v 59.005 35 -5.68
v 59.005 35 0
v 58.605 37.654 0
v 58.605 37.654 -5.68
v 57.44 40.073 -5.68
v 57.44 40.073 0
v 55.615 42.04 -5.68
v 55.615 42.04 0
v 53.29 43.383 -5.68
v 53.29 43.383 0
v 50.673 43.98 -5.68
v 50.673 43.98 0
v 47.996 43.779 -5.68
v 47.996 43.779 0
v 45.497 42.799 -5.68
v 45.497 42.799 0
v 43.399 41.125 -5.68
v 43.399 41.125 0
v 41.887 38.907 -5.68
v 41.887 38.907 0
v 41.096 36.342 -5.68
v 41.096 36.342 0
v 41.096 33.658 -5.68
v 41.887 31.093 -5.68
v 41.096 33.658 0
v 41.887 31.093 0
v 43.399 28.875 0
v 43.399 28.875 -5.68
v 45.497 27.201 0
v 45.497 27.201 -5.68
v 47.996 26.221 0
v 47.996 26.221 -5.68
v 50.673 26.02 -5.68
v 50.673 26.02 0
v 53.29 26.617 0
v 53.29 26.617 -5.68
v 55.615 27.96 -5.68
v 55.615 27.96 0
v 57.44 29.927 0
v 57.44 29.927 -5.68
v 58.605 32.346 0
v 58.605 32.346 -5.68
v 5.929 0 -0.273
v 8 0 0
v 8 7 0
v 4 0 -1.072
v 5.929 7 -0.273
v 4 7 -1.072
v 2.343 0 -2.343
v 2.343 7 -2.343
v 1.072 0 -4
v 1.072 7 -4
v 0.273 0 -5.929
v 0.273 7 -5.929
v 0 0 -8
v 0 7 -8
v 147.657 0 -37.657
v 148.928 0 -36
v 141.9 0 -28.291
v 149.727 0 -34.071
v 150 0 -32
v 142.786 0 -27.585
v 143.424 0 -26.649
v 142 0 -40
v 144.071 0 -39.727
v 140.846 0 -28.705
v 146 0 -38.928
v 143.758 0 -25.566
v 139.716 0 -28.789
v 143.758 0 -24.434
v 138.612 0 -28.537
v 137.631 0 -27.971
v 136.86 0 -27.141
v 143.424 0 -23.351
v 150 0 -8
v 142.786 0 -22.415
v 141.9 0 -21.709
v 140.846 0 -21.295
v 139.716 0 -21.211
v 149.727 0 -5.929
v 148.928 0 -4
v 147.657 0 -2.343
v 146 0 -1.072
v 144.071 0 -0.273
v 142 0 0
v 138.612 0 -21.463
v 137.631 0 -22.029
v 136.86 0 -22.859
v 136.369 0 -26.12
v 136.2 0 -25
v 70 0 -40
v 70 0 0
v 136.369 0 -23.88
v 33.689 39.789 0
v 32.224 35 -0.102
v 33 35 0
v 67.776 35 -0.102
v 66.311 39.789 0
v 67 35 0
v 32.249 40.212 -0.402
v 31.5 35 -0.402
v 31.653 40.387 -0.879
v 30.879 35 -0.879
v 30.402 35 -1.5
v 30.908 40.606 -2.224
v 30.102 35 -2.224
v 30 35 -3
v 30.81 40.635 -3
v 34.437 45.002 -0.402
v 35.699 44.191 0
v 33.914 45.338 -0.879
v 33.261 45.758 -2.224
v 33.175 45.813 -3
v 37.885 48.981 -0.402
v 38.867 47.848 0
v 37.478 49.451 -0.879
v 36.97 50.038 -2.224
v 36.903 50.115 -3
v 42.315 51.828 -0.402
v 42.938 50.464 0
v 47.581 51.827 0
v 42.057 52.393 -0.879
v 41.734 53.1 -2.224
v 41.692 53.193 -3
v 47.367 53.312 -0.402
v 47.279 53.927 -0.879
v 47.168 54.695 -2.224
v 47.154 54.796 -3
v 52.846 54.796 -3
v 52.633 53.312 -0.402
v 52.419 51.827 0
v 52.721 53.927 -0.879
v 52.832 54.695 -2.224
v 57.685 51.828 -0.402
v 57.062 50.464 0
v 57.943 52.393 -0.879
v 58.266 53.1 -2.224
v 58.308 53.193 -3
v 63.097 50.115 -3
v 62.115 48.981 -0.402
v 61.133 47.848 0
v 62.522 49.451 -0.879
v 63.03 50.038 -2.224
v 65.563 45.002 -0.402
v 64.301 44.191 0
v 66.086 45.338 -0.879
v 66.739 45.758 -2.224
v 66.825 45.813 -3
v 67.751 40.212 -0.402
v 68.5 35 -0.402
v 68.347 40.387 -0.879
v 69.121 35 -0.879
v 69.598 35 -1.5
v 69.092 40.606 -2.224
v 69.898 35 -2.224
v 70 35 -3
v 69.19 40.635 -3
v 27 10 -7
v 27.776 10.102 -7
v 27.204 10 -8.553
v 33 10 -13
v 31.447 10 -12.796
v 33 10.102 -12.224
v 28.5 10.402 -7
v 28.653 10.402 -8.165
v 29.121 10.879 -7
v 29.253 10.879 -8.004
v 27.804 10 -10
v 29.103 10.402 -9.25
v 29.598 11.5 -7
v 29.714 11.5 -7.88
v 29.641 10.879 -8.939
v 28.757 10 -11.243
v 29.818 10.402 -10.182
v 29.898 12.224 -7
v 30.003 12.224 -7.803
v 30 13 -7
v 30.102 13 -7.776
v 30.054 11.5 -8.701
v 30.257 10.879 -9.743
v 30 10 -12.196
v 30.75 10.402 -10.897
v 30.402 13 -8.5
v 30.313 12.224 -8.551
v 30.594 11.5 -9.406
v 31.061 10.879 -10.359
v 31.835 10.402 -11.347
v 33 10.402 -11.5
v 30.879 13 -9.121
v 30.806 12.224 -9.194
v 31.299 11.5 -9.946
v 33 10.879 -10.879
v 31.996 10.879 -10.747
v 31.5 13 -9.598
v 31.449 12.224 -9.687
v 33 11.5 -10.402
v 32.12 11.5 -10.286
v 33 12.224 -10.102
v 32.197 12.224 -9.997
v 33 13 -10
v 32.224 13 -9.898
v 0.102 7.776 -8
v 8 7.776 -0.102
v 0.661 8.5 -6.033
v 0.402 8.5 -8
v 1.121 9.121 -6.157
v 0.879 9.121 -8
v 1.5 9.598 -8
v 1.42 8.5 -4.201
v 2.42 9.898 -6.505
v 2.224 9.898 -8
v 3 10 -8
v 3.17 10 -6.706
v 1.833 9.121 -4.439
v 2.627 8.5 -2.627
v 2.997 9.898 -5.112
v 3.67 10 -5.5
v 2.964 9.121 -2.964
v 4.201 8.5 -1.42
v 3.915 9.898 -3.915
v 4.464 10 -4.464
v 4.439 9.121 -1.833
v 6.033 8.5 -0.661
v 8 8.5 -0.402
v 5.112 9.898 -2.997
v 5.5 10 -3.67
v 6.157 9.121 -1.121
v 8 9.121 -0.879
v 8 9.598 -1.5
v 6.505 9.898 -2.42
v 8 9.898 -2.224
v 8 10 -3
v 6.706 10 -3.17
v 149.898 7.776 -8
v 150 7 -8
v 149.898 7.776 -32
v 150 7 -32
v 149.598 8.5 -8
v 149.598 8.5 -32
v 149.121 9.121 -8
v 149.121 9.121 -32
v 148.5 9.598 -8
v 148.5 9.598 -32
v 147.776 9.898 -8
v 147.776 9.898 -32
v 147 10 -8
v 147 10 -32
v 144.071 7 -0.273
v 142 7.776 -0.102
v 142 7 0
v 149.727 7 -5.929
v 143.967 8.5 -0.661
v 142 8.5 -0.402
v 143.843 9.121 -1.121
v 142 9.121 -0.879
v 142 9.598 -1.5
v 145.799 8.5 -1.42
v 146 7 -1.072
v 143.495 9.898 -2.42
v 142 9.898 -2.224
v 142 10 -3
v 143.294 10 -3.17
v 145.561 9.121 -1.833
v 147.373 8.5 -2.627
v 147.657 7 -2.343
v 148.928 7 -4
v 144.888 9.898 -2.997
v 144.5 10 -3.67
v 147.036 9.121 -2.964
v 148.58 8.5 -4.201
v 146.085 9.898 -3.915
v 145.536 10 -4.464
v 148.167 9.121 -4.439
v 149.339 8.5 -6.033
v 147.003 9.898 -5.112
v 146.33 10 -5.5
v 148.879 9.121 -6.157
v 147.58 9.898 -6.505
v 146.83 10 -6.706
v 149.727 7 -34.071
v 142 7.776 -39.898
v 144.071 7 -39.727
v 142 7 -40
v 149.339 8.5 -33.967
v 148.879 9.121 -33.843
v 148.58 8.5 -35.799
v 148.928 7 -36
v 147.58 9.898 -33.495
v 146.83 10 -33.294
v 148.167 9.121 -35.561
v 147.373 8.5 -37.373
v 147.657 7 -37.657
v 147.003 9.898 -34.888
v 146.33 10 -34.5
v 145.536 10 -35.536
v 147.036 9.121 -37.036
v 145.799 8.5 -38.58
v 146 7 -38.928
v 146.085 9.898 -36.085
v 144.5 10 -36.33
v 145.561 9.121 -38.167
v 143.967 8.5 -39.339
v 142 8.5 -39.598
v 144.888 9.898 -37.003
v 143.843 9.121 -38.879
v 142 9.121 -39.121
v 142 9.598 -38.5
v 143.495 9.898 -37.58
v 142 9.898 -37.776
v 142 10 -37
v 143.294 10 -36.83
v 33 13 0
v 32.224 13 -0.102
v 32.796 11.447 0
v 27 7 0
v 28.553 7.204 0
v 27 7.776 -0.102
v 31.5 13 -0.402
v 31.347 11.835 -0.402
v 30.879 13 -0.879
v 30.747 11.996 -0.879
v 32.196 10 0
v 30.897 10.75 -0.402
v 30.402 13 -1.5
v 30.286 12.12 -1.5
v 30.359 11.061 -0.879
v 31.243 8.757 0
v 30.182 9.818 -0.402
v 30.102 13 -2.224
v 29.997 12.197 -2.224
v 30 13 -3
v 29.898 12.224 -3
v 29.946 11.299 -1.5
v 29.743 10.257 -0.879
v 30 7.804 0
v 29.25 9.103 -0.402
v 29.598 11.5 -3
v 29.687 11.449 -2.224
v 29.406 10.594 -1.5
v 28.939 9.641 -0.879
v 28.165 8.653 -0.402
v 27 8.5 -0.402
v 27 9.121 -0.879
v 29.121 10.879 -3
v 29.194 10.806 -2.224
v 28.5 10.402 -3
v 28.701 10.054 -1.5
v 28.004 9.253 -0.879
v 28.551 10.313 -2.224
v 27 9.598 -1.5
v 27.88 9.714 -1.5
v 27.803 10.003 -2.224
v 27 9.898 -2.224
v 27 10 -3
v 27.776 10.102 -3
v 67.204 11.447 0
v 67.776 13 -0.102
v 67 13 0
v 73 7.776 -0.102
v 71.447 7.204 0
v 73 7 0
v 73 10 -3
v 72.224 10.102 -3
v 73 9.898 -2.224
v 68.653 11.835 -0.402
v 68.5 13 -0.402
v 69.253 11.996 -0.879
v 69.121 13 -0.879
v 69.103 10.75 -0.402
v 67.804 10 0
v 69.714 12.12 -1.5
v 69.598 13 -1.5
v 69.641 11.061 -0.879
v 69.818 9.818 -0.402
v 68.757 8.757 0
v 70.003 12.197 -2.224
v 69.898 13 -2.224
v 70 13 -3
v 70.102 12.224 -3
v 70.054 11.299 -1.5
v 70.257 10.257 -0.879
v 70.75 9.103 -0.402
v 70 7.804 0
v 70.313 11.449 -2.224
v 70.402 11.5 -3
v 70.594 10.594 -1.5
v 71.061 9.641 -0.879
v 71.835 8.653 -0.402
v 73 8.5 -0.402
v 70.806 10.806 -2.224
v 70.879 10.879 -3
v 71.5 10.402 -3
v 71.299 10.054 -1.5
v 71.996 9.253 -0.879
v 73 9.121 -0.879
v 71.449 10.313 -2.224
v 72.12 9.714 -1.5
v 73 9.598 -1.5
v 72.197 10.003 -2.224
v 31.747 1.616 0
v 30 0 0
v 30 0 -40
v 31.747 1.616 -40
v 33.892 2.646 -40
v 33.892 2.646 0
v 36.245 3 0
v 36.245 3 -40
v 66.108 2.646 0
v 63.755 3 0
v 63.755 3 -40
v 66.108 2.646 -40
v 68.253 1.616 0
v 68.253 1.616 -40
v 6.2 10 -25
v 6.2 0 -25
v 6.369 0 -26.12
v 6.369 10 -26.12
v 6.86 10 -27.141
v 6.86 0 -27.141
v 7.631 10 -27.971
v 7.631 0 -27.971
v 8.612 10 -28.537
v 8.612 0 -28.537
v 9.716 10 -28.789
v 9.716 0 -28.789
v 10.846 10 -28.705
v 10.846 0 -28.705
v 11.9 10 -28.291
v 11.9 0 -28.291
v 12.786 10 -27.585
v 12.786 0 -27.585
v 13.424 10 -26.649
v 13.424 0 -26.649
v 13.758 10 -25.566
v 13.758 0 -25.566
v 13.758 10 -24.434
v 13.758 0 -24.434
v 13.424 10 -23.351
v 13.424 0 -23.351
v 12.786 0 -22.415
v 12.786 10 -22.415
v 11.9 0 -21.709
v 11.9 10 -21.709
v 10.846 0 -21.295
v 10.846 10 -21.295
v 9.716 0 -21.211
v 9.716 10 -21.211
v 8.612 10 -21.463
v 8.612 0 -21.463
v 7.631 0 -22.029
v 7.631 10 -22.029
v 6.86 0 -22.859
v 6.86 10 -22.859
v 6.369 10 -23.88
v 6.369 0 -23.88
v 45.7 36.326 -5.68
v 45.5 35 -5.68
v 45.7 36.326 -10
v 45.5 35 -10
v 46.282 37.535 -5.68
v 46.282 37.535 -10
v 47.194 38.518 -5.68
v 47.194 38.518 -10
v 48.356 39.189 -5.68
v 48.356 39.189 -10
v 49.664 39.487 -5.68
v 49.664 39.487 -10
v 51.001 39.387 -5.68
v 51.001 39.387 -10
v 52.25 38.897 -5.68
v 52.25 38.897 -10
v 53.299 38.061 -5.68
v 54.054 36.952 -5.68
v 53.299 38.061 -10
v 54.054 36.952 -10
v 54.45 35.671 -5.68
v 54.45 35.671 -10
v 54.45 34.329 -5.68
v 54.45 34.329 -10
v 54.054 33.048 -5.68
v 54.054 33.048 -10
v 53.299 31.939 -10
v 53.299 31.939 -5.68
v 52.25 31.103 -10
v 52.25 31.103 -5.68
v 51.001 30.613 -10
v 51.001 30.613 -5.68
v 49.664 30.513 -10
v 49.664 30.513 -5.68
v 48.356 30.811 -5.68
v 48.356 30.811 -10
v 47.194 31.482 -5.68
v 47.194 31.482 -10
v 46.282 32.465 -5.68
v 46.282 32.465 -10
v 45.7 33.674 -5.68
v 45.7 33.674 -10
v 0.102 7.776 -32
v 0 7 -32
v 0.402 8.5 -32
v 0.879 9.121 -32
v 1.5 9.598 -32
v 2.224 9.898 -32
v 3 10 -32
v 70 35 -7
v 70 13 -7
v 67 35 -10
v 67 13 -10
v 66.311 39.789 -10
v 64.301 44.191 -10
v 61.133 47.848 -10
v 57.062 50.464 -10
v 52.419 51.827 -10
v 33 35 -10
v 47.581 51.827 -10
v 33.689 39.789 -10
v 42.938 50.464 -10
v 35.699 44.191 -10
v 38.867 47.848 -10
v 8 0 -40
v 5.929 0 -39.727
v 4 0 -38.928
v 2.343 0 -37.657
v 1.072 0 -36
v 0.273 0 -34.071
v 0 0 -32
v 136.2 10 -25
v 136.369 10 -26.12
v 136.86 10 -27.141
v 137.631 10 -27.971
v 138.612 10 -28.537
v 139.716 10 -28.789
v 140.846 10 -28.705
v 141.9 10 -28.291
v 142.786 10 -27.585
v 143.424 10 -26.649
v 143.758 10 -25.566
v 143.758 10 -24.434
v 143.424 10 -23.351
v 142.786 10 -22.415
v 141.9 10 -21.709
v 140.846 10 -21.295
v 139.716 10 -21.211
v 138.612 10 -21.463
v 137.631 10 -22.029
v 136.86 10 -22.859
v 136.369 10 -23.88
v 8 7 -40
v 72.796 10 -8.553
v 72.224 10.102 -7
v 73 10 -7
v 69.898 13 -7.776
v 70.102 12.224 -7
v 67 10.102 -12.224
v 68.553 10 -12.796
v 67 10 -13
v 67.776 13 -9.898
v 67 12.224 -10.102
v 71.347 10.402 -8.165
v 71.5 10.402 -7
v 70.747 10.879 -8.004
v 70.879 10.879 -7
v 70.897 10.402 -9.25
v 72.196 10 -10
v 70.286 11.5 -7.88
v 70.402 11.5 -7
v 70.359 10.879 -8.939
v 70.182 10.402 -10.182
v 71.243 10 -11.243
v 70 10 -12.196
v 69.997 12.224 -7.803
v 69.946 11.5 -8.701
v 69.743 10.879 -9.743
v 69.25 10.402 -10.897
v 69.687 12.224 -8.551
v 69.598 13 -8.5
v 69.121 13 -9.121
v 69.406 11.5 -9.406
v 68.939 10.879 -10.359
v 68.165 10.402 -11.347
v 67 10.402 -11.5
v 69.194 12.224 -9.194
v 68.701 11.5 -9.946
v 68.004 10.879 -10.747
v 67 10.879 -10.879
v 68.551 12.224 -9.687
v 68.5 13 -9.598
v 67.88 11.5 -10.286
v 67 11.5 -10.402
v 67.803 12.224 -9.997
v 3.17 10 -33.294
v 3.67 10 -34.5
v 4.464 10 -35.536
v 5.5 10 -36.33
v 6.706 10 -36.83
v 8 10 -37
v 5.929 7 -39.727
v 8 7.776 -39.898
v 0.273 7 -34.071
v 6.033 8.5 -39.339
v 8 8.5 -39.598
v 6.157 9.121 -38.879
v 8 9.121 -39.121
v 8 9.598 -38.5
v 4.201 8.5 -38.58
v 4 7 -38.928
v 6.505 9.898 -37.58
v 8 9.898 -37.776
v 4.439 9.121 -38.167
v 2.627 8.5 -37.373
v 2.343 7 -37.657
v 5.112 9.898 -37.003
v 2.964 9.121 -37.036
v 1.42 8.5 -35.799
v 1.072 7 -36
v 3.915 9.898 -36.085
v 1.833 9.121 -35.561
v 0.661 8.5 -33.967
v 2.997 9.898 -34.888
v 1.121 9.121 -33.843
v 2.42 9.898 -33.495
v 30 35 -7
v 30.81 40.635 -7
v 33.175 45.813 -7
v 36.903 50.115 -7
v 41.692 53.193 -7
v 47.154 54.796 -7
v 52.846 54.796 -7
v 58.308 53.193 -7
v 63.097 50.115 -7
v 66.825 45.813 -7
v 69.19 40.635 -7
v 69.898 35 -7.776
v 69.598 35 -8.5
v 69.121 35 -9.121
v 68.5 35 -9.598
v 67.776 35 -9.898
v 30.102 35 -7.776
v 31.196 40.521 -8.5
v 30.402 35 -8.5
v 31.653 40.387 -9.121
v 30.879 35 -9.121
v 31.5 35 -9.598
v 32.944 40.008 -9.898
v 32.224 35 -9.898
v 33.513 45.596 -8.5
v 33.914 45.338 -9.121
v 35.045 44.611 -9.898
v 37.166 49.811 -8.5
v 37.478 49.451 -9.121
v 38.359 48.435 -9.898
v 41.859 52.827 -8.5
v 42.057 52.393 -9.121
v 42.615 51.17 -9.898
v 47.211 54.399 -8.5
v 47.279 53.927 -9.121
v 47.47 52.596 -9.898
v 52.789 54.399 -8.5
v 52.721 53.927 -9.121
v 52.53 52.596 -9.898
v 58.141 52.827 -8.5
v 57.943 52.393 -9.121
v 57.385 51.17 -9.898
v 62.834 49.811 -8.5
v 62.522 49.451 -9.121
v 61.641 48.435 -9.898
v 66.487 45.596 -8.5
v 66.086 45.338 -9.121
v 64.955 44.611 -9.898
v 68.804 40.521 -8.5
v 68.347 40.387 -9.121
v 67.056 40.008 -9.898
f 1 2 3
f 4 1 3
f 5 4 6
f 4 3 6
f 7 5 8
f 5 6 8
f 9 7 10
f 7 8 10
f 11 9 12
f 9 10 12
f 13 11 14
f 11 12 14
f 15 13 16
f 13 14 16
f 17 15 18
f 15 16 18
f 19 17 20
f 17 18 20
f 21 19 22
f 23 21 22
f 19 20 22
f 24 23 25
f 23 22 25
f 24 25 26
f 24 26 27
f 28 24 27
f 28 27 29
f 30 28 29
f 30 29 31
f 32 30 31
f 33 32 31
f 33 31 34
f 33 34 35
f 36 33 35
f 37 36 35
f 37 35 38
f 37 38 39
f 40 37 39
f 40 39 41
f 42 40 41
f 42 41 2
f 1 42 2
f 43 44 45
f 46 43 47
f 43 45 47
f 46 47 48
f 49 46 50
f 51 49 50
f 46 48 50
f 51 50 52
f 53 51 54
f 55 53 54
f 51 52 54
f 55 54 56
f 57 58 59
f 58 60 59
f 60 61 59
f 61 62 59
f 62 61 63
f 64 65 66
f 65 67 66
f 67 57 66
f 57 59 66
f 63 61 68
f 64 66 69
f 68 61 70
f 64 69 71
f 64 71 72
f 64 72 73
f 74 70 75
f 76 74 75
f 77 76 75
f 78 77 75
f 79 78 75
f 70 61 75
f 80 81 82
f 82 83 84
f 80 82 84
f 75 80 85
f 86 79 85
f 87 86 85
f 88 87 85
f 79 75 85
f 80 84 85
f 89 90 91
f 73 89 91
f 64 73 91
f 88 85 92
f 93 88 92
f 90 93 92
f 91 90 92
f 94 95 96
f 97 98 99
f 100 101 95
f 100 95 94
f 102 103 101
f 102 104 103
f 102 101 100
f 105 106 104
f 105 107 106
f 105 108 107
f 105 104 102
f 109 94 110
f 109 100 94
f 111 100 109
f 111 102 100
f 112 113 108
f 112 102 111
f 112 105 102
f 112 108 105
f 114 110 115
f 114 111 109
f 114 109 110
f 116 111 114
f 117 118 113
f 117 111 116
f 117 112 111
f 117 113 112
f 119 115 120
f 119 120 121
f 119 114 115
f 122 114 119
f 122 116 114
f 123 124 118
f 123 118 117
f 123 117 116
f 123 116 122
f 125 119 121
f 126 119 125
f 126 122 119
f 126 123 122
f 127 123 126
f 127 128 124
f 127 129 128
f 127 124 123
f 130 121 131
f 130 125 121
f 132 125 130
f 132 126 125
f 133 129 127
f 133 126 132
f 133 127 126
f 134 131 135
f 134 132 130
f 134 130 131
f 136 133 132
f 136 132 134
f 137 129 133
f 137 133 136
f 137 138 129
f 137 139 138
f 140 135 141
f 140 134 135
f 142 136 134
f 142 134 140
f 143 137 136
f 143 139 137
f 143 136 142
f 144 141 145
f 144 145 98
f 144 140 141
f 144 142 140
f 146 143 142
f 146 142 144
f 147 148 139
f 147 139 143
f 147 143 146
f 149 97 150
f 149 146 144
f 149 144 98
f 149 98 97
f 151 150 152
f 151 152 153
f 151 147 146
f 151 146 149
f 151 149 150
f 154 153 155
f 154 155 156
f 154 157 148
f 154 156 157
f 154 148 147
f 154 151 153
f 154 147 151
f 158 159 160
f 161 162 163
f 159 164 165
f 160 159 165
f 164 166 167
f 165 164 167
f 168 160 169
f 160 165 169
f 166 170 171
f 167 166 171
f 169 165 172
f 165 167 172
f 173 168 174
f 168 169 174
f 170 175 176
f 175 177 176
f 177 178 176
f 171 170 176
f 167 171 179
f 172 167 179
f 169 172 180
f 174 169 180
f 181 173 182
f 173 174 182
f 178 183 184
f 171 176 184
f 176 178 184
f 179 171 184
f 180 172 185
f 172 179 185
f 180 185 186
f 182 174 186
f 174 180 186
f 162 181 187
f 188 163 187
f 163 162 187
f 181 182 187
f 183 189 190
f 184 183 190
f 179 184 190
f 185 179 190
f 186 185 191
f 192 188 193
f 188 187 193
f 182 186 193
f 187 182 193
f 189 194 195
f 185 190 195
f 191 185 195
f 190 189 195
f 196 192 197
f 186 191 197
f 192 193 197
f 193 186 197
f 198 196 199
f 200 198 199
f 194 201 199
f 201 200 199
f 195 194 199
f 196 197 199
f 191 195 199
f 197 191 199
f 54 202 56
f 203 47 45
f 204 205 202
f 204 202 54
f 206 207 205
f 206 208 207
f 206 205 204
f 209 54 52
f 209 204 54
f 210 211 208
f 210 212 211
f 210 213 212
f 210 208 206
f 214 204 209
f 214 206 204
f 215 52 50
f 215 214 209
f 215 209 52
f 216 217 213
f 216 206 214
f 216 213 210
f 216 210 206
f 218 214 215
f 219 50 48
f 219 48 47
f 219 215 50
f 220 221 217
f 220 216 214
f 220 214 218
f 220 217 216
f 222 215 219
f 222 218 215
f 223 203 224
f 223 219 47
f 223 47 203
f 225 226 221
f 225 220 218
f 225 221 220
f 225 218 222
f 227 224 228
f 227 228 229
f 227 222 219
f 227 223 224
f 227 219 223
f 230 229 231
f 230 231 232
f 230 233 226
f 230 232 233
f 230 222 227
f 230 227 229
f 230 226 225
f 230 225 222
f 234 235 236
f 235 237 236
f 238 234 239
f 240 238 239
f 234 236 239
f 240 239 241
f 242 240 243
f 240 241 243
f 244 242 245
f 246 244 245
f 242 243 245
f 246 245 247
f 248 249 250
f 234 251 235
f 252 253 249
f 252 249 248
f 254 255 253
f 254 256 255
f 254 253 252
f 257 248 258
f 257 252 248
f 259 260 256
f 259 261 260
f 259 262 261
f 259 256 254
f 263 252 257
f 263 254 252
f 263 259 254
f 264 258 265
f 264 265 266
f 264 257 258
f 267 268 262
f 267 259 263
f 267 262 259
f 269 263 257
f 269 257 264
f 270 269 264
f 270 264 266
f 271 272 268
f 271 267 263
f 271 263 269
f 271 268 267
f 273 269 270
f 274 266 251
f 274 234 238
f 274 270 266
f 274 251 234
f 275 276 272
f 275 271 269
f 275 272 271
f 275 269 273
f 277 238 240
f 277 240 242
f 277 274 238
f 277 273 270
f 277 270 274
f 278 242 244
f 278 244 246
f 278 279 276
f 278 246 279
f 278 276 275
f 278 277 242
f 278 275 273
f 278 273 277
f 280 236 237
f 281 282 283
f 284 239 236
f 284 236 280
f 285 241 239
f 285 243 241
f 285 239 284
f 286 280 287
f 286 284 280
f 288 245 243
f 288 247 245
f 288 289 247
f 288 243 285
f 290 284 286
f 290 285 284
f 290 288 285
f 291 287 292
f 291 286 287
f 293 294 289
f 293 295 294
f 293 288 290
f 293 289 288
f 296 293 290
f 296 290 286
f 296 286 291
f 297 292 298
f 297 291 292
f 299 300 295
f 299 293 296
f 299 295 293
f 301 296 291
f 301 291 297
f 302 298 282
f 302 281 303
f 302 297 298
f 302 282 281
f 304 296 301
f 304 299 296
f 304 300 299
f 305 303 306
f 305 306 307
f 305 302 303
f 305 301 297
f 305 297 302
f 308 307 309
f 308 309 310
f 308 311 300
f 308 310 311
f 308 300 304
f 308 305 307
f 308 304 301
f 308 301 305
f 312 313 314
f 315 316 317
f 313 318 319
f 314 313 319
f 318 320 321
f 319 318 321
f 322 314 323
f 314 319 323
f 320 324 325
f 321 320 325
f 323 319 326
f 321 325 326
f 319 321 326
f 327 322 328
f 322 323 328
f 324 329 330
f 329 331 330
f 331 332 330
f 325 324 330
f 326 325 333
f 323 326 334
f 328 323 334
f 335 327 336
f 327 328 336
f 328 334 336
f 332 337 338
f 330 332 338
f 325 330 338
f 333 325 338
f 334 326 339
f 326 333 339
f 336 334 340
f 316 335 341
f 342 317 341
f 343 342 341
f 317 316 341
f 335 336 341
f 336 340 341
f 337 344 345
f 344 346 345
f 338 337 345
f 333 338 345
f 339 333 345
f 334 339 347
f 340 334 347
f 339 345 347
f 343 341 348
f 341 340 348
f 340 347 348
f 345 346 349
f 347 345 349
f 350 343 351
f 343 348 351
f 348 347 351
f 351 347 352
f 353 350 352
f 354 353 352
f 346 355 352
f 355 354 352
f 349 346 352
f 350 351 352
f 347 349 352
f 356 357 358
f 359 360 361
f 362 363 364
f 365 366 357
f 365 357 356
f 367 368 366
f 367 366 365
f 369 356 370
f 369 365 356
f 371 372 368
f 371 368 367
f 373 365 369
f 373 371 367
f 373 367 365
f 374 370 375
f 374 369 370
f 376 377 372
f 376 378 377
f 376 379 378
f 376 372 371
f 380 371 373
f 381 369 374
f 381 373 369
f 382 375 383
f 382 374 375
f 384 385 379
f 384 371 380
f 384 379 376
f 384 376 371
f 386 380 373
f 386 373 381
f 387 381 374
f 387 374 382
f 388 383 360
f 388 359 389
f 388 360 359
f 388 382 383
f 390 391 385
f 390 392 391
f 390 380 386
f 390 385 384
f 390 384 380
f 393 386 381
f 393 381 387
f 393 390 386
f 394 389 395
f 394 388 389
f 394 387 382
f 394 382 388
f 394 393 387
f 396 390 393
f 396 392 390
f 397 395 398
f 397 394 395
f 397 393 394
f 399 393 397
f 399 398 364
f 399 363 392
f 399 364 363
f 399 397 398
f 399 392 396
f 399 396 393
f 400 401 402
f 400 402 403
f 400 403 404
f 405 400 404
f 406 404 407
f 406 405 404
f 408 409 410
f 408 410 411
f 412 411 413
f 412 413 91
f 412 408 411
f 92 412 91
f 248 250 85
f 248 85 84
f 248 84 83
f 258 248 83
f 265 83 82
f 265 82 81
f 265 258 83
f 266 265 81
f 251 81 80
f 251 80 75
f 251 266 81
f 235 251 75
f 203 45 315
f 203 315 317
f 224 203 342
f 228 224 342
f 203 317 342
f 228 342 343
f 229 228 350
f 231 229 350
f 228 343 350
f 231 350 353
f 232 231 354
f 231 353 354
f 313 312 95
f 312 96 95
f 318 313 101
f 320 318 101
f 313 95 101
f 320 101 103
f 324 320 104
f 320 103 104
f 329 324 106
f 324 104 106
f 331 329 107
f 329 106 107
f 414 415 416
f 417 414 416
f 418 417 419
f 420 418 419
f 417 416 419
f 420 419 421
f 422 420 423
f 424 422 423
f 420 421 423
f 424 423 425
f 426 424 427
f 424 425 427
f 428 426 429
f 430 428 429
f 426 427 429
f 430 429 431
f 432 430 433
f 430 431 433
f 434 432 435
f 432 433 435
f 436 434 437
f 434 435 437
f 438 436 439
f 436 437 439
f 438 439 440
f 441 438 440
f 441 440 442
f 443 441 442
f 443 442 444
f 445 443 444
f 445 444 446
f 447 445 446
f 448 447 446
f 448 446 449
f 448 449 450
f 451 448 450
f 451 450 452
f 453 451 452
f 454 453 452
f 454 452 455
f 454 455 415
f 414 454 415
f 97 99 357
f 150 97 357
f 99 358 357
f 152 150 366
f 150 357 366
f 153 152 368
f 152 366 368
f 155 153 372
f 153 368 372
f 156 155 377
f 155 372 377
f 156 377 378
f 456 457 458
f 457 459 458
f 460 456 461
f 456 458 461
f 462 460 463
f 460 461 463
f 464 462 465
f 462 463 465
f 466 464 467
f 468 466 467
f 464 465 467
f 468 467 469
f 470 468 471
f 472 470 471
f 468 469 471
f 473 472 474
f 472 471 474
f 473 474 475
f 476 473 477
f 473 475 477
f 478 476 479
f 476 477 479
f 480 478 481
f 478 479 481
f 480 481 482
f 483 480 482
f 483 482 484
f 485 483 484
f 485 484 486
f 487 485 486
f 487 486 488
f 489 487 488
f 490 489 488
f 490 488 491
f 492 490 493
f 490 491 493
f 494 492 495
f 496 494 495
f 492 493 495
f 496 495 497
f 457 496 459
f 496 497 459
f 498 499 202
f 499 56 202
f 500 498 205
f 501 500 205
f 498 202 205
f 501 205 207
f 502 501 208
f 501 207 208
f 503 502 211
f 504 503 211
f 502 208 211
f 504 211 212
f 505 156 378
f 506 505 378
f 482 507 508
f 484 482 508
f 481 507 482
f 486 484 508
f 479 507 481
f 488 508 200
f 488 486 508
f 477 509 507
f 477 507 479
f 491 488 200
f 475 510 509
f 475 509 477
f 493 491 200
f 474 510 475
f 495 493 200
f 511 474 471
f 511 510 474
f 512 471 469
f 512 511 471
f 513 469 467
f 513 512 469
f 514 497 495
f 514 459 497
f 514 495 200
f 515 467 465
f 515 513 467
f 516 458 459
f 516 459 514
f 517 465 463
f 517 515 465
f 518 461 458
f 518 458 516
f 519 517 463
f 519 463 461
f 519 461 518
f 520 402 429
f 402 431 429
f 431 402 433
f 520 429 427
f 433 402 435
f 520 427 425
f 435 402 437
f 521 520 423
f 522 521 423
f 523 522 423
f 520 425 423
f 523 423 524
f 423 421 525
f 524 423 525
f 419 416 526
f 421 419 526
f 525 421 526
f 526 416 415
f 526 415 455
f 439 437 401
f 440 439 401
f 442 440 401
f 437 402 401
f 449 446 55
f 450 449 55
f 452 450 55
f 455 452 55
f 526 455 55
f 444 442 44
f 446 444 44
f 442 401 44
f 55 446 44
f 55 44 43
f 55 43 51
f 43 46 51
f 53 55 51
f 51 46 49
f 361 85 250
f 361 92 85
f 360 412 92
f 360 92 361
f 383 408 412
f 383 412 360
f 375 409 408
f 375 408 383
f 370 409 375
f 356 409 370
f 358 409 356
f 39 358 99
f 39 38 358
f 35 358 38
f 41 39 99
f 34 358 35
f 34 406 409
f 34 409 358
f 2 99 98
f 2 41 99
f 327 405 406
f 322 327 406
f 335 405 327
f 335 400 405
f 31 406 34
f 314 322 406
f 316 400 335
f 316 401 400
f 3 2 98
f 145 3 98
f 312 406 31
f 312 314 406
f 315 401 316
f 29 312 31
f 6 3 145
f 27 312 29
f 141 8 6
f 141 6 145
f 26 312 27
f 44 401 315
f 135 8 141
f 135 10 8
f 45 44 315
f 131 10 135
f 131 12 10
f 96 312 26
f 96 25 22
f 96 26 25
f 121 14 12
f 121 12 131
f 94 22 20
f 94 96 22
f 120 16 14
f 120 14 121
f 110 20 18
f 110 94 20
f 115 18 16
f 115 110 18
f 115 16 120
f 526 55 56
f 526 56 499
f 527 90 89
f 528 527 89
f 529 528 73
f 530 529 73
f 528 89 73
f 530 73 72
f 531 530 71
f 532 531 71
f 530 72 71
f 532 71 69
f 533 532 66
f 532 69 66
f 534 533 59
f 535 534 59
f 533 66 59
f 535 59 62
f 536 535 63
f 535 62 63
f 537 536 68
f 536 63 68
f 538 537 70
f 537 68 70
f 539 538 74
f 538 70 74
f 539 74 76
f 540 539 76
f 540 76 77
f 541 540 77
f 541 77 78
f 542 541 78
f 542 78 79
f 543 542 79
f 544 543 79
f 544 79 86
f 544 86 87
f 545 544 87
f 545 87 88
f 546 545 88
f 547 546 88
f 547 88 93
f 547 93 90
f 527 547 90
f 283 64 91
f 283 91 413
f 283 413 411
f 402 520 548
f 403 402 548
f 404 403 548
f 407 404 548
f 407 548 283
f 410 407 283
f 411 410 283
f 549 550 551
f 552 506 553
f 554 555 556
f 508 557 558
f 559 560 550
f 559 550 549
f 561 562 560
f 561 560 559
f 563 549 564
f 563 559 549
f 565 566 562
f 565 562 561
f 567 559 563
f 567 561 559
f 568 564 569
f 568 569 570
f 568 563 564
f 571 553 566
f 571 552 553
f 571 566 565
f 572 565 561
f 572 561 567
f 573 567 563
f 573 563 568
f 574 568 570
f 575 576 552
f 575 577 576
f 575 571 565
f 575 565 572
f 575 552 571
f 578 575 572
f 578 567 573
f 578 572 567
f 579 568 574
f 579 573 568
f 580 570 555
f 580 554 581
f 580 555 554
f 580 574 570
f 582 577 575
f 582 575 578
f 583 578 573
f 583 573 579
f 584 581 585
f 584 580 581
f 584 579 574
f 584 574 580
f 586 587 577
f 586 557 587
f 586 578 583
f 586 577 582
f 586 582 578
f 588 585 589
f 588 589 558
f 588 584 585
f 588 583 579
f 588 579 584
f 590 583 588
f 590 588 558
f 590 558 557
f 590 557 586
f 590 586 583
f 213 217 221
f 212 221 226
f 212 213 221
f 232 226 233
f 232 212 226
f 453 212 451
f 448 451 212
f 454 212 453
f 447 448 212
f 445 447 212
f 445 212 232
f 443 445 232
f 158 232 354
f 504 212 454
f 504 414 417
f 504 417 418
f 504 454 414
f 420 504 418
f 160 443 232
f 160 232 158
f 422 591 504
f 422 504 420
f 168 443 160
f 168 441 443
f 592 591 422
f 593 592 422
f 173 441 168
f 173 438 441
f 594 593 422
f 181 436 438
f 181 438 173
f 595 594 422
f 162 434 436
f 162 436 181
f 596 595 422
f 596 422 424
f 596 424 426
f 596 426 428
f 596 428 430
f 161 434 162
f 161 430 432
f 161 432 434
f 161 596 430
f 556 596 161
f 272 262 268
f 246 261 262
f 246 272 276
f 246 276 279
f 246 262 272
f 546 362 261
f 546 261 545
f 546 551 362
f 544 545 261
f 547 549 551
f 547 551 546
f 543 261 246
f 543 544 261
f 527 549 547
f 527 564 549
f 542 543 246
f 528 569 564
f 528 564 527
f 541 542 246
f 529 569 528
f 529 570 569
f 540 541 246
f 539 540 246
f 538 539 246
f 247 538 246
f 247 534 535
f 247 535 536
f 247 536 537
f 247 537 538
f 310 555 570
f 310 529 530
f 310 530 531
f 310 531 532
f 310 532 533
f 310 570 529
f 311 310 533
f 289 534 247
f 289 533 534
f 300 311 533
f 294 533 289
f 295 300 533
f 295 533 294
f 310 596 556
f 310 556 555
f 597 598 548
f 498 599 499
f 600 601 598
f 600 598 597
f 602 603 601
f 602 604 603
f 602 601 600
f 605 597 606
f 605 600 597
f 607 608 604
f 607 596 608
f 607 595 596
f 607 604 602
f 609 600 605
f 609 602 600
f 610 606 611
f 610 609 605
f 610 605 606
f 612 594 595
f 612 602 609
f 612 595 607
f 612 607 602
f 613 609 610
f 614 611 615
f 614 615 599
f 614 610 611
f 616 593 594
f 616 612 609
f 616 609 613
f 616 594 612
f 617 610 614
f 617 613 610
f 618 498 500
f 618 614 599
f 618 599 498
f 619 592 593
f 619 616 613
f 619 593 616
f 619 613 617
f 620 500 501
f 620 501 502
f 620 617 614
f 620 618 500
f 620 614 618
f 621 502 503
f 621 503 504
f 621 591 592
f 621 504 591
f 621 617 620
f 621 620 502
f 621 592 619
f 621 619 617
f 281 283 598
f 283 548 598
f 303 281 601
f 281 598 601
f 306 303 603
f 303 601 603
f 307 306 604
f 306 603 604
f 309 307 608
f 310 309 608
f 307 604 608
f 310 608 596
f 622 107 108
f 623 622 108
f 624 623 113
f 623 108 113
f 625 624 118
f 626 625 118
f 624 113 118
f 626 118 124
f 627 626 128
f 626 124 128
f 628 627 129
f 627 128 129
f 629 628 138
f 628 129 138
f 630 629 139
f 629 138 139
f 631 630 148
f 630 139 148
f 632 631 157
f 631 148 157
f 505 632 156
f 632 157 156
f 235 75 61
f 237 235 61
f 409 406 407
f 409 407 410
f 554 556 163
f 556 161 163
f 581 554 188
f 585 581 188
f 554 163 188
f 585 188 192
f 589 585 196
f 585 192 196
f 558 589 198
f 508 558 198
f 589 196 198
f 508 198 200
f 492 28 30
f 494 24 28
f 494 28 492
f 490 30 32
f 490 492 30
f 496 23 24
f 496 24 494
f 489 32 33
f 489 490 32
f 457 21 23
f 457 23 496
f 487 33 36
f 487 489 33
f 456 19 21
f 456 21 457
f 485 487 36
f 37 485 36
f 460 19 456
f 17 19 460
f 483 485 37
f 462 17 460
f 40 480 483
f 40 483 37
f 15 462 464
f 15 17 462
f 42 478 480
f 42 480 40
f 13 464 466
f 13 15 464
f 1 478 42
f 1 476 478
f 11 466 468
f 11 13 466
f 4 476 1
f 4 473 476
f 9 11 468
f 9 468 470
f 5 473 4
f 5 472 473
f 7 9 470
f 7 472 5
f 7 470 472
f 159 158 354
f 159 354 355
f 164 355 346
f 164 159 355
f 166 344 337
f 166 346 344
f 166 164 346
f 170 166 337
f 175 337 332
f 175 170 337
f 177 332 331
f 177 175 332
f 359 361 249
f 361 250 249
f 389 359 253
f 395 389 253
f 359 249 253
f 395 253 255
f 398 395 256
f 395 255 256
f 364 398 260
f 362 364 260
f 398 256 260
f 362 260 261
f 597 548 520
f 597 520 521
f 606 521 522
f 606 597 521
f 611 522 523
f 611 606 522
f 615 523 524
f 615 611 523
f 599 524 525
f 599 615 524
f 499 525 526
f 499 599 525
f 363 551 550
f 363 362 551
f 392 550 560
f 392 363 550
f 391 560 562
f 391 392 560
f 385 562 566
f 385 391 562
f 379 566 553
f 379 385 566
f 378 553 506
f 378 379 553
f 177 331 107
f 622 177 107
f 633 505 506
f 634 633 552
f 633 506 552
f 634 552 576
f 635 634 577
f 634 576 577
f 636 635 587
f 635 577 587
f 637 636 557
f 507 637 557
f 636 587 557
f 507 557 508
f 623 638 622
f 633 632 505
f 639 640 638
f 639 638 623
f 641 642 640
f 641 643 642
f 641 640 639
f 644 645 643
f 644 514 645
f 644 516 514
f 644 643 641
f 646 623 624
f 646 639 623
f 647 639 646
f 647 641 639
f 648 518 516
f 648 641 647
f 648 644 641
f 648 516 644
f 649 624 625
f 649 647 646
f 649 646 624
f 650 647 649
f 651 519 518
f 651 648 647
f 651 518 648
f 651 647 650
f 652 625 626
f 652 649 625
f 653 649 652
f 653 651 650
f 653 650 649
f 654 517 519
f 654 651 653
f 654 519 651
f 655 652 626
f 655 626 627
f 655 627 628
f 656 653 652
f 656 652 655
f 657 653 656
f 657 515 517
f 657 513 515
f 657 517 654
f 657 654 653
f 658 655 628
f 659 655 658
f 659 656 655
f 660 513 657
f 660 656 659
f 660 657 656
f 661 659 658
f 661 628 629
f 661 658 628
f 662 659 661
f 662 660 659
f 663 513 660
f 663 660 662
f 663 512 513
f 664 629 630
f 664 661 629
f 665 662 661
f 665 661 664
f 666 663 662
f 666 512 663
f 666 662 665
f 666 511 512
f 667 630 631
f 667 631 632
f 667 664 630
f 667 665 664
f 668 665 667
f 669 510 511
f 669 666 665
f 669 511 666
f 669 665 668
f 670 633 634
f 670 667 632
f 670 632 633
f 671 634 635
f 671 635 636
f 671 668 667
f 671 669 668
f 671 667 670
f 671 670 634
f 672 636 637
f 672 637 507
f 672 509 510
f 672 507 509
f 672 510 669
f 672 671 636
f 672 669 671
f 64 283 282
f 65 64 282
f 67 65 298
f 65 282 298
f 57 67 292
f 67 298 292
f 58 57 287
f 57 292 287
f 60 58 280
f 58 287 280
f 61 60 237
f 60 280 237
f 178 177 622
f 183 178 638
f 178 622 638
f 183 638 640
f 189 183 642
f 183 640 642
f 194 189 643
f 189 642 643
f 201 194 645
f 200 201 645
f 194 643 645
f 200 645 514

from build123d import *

# Parameters (mm, degrees)
CROQUIS1_W                                           = 150
CROQUIS1_H                                           = 40
SALIENTE_EXTRUIR1_DEPTH                              = 10
SALIENTE_EXTRUIR2_DEPTH                              = 10
CROQUIS3_W                                           = 40
CROQUIS3_H                                           = 3
CORTAR_EXTRUIR1_DEPTH                                = 165.69669092
REFRENTADO_PARA_PERNO_CON_CABEZA_HEXAGON_D           = 9
REFRENTADO_PARA_PERNO_CON_CABEZA_HEXAGON_CBORE_D     = 18.01
REFRENTADO_PARA_PERNO_CON_CABEZA_HEXAGON_CBORE_DEPTH = 5.68
REDONDEO1_R                                          = 8
REDONDEO2_R                                          = 8
REDONDEO3_R                                          = 3
TALADRO_DE_MARGEN_PARA_M71_D                         = 7.6


with BuildPart() as part:
    # Croquis1 → Saliente-Extruir1 (new body)
    with BuildSketch(Plane(origin=(0, 0, 0), x_dir=(1, 0, 0), z_dir=(0, 1, 0))):
        with Locations((75, 20)):
            Rectangle(CROQUIS1_W, CROQUIS1_H)
    extrude(amount=SALIENTE_EXTRUIR1_DEPTH)

    # Croquis2 → Saliente-Extruir2 (add)
    with BuildSketch(Plane.XY):
        with BuildLine():
            Line((30, 0), (30, 35))
            ThreePointArc((30, 35), (50, 55), (70, 35))
            Line((70, 35), (70, 0))
            Line((70, 0), (30, 0))
        make_face()
    extrude(amount=-SALIENTE_EXTRUIR2_DEPTH)

    # Croquis3 → Cortar-Extruir1 (cut, through all)
    with BuildSketch(Plane.XY):
        with Locations((50, 1.5)):
            Rectangle(CROQUIS3_W, CROQUIS3_H)
    extrude(amount=-CORTAR_EXTRUIR1_DEPTH, mode=Mode.SUBTRACT)

    # Refrentado para perno con cabeza hexagonal de M81 (through all)
    with Locations(Plane.XY):
        with Locations((50, 35)):
            CounterBoreHole(REFRENTADO_PARA_PERNO_CON_CABEZA_HEXAGON_D / 2, REFRENTADO_PARA_PERNO_CON_CABEZA_HEXAGON_CBORE_D / 2, REFRENTADO_PARA_PERNO_CON_CABEZA_HEXAGON_CBORE_DEPTH)

    # Redondeo1
    # the kernel refuses this fillet: 8 mm, written as the material it adds along each edge
    with BuildSketch(Plane(origin=(70, 3, 0), x_dir=(-1, 0, 0), z_dir=(0, 0, -1))) as redondeo1_piece_1:
        with BuildLine():
            CenterArc((6.244997998, -8), REDONDEO1_R, 90, 51.317812547)
            Line((0, -3), (-0.12489996, -2.9))
            ThreePointArc((-0.12489996, -2.9), (-0.16, -1.5), (-0.16, 0))
            Line((-0.16, 0), (0, 0.16))
            Line((0, 0.16), (6.244997998, 0.16))
            Line((6.244997998, 0.16), (6.244997998, 0))
        make_face()
    extrude(amount=40)
    with BuildSketch(Plane(origin=(30, 3, 0), x_dir=(0, -1, 0), z_dir=(0, 0, -1))) as redondeo1_piece_2:
        with BuildLine():
            CenterArc((8, -6.244997998), REDONDEO1_R, 128.682187453, 51.317812547)
            Line((0, -6.244997998), (-0.16, -6.244997998))
            Line((-0.16, -6.244997998), (-0.16, 0))
            Line((-0.16, 0), (0, 0.16))
            ThreePointArc((0, 0.16), (1.5, 0.16), (2.9, 0.12489996))
            Line((2.9, 0.12489996), (3, 0))
        make_face()
    extrude(amount=40)

    # Redondeo2
    redondeo2_edges = [part.edges().sort_by_distance(p)[0] for p in [
        (0, 5, -40),
        (0, 5, 0),
        (150, 5, 0),
        (150, 5, -40),
    ]]
    fillet(redondeo2_edges, radius=REDONDEO2_R)

    # Redondeo3
    redondeo3_edges = [part.edges().sort_by_distance(p)[0] for p in [
        (106, 10, 0),
        (30, 22.5, -10),
        (30, 10, -5),
        (50, 55, -10),
        (70, 10, -5),
        (70, 22.5, -10),
        (50, 10, -10),
        (70, 22.5, 0),
        (50, 55, 0),
        (30, 22.5, 0),
        (150, 10, -20),
        (19, 10, 0),
        (75, 10, -40),
        (0, 10, -20),
        (2.343145751, 10, -2.343145751),
        (2.343145751, 10, -37.656854249),
        (147.656854249, 10, -37.656854249),
        (147.656854249, 10, -2.343145751),
    ]]
    fillet(redondeo3_edges, radius=REDONDEO3_R)

    # Taladro de margen para M71 (through all)
    with Locations(Plane(origin=(0, 10, 0), x_dir=(1, 0, 0), z_dir=(0, 1, 0))):
        with Locations((140, 25), (10, 25)):
            Hole(TALADRO_DE_MARGEN_PARA_M71_D / 2)


solid = part.part
